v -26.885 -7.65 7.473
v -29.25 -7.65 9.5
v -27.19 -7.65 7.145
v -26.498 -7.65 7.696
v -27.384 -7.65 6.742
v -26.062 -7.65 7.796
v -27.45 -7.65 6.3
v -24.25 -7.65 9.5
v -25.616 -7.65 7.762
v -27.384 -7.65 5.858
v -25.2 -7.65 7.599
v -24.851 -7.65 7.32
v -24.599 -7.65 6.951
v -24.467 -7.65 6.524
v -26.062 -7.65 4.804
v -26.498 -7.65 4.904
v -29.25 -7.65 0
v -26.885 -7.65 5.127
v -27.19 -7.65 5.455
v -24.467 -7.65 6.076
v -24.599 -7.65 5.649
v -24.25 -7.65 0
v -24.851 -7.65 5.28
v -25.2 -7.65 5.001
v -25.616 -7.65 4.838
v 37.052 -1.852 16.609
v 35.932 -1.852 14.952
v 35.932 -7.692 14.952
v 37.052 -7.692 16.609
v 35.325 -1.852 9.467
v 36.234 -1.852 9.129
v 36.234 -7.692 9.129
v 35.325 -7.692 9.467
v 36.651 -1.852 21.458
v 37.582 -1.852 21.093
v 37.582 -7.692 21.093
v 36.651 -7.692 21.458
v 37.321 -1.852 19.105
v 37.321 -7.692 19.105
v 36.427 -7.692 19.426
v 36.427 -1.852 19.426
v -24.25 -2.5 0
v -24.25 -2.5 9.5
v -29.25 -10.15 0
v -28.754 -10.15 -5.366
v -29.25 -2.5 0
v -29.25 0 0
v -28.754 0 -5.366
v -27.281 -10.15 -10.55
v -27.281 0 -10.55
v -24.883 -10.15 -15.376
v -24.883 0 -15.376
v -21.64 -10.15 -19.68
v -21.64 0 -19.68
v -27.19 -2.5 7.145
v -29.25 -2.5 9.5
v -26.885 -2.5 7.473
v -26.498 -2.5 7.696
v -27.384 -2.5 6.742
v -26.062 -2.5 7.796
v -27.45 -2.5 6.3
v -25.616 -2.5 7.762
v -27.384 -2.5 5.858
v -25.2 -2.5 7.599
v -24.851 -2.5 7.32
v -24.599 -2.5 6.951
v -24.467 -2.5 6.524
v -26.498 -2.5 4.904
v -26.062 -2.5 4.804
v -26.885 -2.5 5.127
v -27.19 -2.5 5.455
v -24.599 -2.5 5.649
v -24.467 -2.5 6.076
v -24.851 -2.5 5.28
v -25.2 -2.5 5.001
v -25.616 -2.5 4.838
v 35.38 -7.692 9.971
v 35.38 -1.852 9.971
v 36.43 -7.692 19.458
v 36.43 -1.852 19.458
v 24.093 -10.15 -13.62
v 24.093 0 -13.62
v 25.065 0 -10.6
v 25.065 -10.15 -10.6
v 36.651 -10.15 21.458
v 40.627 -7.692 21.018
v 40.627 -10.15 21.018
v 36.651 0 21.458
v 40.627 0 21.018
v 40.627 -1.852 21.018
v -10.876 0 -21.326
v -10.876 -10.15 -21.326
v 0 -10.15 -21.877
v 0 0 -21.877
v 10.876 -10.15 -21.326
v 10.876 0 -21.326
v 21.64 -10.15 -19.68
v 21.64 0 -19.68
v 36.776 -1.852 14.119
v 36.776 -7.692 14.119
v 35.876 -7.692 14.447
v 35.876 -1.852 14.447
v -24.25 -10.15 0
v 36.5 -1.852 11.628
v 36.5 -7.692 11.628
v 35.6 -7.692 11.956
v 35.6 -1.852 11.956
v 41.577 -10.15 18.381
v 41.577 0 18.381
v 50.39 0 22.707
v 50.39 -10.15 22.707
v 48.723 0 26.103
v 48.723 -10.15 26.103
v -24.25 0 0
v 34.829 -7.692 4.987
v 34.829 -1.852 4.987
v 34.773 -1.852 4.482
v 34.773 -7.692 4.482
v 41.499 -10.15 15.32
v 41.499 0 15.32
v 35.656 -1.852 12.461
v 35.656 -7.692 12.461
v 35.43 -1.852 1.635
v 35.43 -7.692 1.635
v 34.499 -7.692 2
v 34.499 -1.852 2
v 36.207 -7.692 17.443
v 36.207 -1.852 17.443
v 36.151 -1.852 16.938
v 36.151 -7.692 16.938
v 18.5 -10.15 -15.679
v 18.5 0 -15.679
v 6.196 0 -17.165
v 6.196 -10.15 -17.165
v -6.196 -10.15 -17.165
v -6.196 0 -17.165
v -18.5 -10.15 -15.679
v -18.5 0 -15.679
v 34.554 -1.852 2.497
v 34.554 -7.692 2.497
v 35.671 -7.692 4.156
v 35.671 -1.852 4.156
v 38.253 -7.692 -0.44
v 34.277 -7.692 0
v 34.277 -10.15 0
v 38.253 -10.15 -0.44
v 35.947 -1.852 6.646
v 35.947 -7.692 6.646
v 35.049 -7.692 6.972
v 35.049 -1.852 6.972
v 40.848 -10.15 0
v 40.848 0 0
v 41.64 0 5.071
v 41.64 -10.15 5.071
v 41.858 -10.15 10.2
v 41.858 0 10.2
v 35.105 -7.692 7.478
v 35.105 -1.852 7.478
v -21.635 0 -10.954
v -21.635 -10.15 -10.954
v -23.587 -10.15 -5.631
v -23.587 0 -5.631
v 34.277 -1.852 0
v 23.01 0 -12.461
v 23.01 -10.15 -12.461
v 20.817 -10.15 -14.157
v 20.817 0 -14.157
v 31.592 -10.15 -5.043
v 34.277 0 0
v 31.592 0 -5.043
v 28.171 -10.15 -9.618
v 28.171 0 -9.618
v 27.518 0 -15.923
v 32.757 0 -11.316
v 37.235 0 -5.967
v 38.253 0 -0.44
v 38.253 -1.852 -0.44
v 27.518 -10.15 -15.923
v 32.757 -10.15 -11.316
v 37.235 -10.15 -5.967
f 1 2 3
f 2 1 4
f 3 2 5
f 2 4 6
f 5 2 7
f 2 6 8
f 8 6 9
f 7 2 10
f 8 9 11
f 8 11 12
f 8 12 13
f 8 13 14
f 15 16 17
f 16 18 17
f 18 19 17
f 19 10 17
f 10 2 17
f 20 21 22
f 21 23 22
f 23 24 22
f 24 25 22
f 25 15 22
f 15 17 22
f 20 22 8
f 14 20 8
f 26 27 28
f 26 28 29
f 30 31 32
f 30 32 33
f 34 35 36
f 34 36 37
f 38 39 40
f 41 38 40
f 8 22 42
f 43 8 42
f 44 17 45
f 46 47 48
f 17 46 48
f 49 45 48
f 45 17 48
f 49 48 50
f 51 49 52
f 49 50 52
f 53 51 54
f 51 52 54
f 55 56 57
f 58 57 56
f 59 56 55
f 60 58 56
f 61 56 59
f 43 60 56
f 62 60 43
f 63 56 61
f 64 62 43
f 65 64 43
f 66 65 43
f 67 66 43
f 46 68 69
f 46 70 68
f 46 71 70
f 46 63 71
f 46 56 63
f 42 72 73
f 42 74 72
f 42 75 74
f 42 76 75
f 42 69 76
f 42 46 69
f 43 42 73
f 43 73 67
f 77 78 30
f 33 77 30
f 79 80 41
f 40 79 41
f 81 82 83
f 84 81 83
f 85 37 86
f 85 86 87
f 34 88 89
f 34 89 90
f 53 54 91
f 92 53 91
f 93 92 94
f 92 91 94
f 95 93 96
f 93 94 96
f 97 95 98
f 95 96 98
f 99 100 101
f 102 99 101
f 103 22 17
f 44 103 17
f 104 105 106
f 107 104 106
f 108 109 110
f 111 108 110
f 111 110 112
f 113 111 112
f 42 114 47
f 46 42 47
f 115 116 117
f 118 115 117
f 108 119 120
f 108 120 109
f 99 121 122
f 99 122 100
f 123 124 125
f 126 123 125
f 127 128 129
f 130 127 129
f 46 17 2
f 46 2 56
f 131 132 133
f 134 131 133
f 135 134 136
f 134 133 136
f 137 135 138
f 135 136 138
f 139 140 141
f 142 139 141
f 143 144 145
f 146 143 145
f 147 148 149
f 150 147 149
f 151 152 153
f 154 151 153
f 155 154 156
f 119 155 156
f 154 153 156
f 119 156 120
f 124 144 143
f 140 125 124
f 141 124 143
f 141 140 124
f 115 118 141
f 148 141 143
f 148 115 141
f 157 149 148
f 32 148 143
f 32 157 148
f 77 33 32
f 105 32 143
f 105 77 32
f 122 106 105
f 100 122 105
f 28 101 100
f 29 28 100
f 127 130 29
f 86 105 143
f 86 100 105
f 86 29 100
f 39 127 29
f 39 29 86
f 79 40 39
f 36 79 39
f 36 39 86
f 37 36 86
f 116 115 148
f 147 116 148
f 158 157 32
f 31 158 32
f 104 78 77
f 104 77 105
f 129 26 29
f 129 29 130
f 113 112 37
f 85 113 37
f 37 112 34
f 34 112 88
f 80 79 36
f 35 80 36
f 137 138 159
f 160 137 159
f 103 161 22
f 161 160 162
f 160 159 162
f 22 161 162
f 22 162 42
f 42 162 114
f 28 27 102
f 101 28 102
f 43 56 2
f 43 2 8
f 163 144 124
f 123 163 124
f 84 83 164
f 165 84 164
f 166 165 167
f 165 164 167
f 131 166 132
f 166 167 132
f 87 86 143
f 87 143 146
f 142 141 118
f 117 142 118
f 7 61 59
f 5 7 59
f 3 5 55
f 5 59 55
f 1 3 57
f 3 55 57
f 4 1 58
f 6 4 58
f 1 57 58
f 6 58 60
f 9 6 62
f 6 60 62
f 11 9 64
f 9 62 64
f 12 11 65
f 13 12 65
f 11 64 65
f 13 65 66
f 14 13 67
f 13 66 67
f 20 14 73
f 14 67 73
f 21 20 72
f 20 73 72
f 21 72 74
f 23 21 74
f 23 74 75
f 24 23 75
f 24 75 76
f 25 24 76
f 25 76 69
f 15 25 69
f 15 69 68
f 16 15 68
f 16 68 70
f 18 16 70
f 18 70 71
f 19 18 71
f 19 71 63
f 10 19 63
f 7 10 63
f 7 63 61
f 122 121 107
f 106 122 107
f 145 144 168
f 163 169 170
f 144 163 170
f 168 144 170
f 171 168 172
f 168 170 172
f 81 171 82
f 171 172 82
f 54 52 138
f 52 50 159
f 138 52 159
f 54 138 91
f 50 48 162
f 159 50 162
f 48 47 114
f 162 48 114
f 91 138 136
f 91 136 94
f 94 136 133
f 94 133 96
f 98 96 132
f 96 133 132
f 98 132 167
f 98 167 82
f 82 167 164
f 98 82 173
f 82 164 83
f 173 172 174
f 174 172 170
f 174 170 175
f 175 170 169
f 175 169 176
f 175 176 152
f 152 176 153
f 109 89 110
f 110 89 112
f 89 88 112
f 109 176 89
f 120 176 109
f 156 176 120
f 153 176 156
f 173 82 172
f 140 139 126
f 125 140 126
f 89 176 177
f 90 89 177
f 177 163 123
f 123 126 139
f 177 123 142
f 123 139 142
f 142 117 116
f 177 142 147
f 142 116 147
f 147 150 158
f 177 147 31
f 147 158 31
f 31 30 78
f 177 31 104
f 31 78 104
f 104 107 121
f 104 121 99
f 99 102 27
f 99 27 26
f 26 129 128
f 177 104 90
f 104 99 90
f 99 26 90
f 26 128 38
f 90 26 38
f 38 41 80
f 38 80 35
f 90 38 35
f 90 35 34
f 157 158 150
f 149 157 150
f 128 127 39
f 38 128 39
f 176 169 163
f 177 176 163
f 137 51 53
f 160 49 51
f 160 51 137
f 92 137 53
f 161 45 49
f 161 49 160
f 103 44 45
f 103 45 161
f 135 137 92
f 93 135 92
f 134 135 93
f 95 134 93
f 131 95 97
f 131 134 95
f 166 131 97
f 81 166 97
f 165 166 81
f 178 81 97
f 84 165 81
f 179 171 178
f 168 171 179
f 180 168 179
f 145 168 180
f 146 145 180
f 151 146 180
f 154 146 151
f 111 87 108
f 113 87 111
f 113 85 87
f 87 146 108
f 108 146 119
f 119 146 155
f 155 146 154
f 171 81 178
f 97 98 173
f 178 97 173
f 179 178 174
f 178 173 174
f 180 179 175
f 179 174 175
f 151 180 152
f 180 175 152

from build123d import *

# Parameters (mm, degrees)
F1_DEPTH = 10.15
F2_W     = 1.8519068835
F2_H     = 21.5889067106
F2_W_2   = 2.4580931165
F3_DEPTH = 4
F5_DEPTH = 7.6929068835
F6_W     = 5
F6_H     = 5.15
F7_DEPTH = 9.5
F8_R     = 1.5
F9_DEPTH = 7.651


with BuildPart() as f1:
    # F0 (on Front) → F1 (new body)
    with BuildSketch(Plane.XZ):
        with BuildLine():
            ThreePointArc((-18.5, -15.6787953926), (-22.7673477806, -8.35), (-24.2502499979, 0))
            Line((-24.2502499979, 0), (-29.2502499979, 0))
            ThreePointArc((-29.2502499979, 0), (-27.2813970489, -10.55), (-21.6398876928, -19.6797455671))
            ThreePointArc((-21.6398876928, -19.6797455671), (0, -21.8765954826), (21.6398876928, -19.6797455671))
            ThreePointArc((21.6398876928, -19.6797455671), (32.7568623734, -11.3164689916), (40.8481571207, 0))
            ThreePointArc((40.8481571207, 0), (41.8214250715, 7.632604285), (41.4990372956, 15.3202544329))
            Line((41.4990372956, 15.3202544329), (41.5767828027, 18.3806335645))
            Line((41.5767828027, 18.3806335645), (50.389803946, 22.7065682411))
            Line((50.389803946, 22.7065682411), (48.7227849662, 26.10270679))
            Line((48.7227849662, 26.10270679), (36.6513244808, 21.4579887688))
            Line((36.6513244808, 21.4579887688), (34.277380304, 0))
            ThreePointArc((34.277380304, 0), (29.9691571864, -7.3960863272), (24.0930236738, -13.6197455671))
            Line((24.0930236738, -13.6197455671), (25.0645451381, -10.5997455671))
            ThreePointArc((25.0645451381, -10.5997455671), (21.92981042, -13.3299594699), (18.5, -15.6787953926))
            ThreePointArc((18.5, -15.6787953926), (0, -17.3512801115), (-18.5, -15.6787953926))
        make_face()
    extrude(amount=F1_DEPTH)

    # F2 (on face) → F3 (cut)
    with BuildSketch(Plane(origin=(33.8629158132, 0, -3.7463283568), x_dir=(0, -1, 0), z_dir=(-0.9939358698, 0, 0.1099612967))):
        with Locations((0.9259534418, 14.5636385419)):
            Rectangle(F2_W, F2_H)
        with Locations((8.9209534418, 14.5636385419)):
            Rectangle(F2_W_2, F2_H)
    extrude(amount=-F3_DEPTH, mode=Mode.SUBTRACT)

    # F4 (on face) → F5 (cut, through all)
    with BuildSketch(Plane.XZ.offset(7.6919068835)):
        Polygon((34.4986446734, 2), (34.277380304, 0), (35.4295624031, 1.6347710575), align=None)
        Polygon((36.2071527972, 17.4431382552), (36.4265479737, 19.4262426935), (36.379591068, 19.4431382552), align=None)
        Polygon((35.9315717956, 14.9521723361), (36.1512704613, 16.9380200021), (36.1125353235, 16.9521723361), align=None)
        Polygon((35.6560050027, 12.4613348501), (35.8756791772, 14.4469611397), (35.8362903057, 14.4613348501), align=None)
        Polygon((35.3804528293, 9.9706295076), (35.6001020466, 11.9560302114), (35.5600452879, 11.9706295076), align=None)
        Polygon((35.2964822054, 9.4777310046), (35.1046580216, 7.4777310046), (35.324757133, 9.4671982825), align=None)
        Polygon((35.0074181049, 6.9872777462), (34.8291337367, 4.9872777462), (35.0487360064, 6.9722540912), align=None)
        Polygon((34.7311730871, 4.4969679349), (34.5536253217, 2.4969679349), (34.7732012529, 4.4817062071), align=None)
        Polygon((37.0518071993, 16.6089984104), (36.1512704613, 16.9380200021), (35.9315717956, 14.9521723361), align=None)
        Polygon((36.7756964321, 14.1185285934), (35.8756791772, 14.4469611397), (35.6560050027, 12.4613348501), align=None)
        Polygon((36.4995883451, 11.628198721), (35.6001020466, 11.9560302114), (35.3804528293, 9.9706295076), align=None)
        Polygon((35.324757133, 9.4671982825), (35.1046580216, 7.4777310046), (36.2335759695, 9.128653252), align=None)
        Polygon((35.0487360064, 6.9722540912), (34.8291337367, 4.9872777462), (35.9472190993, 6.645555504), align=None)
        Polygon((34.7732012529, 4.4817062071), (34.5536253217, 2.4969679349), (35.6711189912, 4.1556444852), align=None)
        Polygon((37.5822422105, 21.0927598263), (36.6513244808, 21.4579887688), (36.4300601114, 19.4579887688), align=None)
        Polygon((37.320535459, 19.104577104), (36.4265479737, 19.4262426935), (36.2071527972, 17.4431382552), align=None)
    extrude(amount=-F5_DEPTH, mode=Mode.SUBTRACT)

    # F6 (on face) → F7 (join)
    with BuildSketch(Plane.XY):
        with Locations((-26.7502499979, -5.075)):
            Rectangle(F6_W, F6_H)
    extrude(amount=F7_DEPTH)

    # F8 (on face) → F9 (cut, through all)
    with BuildSketch(Plane(origin=(0, -2.5, 0), x_dir=(-1, 0, 0), z_dir=(0, 1, 0))):
        with Locations((25.9502499979, 6.3)):
            Circle(F8_R)
    extrude(amount=-F9_DEPTH, mode=Mode.SUBTRACT)


solid = f1.part
